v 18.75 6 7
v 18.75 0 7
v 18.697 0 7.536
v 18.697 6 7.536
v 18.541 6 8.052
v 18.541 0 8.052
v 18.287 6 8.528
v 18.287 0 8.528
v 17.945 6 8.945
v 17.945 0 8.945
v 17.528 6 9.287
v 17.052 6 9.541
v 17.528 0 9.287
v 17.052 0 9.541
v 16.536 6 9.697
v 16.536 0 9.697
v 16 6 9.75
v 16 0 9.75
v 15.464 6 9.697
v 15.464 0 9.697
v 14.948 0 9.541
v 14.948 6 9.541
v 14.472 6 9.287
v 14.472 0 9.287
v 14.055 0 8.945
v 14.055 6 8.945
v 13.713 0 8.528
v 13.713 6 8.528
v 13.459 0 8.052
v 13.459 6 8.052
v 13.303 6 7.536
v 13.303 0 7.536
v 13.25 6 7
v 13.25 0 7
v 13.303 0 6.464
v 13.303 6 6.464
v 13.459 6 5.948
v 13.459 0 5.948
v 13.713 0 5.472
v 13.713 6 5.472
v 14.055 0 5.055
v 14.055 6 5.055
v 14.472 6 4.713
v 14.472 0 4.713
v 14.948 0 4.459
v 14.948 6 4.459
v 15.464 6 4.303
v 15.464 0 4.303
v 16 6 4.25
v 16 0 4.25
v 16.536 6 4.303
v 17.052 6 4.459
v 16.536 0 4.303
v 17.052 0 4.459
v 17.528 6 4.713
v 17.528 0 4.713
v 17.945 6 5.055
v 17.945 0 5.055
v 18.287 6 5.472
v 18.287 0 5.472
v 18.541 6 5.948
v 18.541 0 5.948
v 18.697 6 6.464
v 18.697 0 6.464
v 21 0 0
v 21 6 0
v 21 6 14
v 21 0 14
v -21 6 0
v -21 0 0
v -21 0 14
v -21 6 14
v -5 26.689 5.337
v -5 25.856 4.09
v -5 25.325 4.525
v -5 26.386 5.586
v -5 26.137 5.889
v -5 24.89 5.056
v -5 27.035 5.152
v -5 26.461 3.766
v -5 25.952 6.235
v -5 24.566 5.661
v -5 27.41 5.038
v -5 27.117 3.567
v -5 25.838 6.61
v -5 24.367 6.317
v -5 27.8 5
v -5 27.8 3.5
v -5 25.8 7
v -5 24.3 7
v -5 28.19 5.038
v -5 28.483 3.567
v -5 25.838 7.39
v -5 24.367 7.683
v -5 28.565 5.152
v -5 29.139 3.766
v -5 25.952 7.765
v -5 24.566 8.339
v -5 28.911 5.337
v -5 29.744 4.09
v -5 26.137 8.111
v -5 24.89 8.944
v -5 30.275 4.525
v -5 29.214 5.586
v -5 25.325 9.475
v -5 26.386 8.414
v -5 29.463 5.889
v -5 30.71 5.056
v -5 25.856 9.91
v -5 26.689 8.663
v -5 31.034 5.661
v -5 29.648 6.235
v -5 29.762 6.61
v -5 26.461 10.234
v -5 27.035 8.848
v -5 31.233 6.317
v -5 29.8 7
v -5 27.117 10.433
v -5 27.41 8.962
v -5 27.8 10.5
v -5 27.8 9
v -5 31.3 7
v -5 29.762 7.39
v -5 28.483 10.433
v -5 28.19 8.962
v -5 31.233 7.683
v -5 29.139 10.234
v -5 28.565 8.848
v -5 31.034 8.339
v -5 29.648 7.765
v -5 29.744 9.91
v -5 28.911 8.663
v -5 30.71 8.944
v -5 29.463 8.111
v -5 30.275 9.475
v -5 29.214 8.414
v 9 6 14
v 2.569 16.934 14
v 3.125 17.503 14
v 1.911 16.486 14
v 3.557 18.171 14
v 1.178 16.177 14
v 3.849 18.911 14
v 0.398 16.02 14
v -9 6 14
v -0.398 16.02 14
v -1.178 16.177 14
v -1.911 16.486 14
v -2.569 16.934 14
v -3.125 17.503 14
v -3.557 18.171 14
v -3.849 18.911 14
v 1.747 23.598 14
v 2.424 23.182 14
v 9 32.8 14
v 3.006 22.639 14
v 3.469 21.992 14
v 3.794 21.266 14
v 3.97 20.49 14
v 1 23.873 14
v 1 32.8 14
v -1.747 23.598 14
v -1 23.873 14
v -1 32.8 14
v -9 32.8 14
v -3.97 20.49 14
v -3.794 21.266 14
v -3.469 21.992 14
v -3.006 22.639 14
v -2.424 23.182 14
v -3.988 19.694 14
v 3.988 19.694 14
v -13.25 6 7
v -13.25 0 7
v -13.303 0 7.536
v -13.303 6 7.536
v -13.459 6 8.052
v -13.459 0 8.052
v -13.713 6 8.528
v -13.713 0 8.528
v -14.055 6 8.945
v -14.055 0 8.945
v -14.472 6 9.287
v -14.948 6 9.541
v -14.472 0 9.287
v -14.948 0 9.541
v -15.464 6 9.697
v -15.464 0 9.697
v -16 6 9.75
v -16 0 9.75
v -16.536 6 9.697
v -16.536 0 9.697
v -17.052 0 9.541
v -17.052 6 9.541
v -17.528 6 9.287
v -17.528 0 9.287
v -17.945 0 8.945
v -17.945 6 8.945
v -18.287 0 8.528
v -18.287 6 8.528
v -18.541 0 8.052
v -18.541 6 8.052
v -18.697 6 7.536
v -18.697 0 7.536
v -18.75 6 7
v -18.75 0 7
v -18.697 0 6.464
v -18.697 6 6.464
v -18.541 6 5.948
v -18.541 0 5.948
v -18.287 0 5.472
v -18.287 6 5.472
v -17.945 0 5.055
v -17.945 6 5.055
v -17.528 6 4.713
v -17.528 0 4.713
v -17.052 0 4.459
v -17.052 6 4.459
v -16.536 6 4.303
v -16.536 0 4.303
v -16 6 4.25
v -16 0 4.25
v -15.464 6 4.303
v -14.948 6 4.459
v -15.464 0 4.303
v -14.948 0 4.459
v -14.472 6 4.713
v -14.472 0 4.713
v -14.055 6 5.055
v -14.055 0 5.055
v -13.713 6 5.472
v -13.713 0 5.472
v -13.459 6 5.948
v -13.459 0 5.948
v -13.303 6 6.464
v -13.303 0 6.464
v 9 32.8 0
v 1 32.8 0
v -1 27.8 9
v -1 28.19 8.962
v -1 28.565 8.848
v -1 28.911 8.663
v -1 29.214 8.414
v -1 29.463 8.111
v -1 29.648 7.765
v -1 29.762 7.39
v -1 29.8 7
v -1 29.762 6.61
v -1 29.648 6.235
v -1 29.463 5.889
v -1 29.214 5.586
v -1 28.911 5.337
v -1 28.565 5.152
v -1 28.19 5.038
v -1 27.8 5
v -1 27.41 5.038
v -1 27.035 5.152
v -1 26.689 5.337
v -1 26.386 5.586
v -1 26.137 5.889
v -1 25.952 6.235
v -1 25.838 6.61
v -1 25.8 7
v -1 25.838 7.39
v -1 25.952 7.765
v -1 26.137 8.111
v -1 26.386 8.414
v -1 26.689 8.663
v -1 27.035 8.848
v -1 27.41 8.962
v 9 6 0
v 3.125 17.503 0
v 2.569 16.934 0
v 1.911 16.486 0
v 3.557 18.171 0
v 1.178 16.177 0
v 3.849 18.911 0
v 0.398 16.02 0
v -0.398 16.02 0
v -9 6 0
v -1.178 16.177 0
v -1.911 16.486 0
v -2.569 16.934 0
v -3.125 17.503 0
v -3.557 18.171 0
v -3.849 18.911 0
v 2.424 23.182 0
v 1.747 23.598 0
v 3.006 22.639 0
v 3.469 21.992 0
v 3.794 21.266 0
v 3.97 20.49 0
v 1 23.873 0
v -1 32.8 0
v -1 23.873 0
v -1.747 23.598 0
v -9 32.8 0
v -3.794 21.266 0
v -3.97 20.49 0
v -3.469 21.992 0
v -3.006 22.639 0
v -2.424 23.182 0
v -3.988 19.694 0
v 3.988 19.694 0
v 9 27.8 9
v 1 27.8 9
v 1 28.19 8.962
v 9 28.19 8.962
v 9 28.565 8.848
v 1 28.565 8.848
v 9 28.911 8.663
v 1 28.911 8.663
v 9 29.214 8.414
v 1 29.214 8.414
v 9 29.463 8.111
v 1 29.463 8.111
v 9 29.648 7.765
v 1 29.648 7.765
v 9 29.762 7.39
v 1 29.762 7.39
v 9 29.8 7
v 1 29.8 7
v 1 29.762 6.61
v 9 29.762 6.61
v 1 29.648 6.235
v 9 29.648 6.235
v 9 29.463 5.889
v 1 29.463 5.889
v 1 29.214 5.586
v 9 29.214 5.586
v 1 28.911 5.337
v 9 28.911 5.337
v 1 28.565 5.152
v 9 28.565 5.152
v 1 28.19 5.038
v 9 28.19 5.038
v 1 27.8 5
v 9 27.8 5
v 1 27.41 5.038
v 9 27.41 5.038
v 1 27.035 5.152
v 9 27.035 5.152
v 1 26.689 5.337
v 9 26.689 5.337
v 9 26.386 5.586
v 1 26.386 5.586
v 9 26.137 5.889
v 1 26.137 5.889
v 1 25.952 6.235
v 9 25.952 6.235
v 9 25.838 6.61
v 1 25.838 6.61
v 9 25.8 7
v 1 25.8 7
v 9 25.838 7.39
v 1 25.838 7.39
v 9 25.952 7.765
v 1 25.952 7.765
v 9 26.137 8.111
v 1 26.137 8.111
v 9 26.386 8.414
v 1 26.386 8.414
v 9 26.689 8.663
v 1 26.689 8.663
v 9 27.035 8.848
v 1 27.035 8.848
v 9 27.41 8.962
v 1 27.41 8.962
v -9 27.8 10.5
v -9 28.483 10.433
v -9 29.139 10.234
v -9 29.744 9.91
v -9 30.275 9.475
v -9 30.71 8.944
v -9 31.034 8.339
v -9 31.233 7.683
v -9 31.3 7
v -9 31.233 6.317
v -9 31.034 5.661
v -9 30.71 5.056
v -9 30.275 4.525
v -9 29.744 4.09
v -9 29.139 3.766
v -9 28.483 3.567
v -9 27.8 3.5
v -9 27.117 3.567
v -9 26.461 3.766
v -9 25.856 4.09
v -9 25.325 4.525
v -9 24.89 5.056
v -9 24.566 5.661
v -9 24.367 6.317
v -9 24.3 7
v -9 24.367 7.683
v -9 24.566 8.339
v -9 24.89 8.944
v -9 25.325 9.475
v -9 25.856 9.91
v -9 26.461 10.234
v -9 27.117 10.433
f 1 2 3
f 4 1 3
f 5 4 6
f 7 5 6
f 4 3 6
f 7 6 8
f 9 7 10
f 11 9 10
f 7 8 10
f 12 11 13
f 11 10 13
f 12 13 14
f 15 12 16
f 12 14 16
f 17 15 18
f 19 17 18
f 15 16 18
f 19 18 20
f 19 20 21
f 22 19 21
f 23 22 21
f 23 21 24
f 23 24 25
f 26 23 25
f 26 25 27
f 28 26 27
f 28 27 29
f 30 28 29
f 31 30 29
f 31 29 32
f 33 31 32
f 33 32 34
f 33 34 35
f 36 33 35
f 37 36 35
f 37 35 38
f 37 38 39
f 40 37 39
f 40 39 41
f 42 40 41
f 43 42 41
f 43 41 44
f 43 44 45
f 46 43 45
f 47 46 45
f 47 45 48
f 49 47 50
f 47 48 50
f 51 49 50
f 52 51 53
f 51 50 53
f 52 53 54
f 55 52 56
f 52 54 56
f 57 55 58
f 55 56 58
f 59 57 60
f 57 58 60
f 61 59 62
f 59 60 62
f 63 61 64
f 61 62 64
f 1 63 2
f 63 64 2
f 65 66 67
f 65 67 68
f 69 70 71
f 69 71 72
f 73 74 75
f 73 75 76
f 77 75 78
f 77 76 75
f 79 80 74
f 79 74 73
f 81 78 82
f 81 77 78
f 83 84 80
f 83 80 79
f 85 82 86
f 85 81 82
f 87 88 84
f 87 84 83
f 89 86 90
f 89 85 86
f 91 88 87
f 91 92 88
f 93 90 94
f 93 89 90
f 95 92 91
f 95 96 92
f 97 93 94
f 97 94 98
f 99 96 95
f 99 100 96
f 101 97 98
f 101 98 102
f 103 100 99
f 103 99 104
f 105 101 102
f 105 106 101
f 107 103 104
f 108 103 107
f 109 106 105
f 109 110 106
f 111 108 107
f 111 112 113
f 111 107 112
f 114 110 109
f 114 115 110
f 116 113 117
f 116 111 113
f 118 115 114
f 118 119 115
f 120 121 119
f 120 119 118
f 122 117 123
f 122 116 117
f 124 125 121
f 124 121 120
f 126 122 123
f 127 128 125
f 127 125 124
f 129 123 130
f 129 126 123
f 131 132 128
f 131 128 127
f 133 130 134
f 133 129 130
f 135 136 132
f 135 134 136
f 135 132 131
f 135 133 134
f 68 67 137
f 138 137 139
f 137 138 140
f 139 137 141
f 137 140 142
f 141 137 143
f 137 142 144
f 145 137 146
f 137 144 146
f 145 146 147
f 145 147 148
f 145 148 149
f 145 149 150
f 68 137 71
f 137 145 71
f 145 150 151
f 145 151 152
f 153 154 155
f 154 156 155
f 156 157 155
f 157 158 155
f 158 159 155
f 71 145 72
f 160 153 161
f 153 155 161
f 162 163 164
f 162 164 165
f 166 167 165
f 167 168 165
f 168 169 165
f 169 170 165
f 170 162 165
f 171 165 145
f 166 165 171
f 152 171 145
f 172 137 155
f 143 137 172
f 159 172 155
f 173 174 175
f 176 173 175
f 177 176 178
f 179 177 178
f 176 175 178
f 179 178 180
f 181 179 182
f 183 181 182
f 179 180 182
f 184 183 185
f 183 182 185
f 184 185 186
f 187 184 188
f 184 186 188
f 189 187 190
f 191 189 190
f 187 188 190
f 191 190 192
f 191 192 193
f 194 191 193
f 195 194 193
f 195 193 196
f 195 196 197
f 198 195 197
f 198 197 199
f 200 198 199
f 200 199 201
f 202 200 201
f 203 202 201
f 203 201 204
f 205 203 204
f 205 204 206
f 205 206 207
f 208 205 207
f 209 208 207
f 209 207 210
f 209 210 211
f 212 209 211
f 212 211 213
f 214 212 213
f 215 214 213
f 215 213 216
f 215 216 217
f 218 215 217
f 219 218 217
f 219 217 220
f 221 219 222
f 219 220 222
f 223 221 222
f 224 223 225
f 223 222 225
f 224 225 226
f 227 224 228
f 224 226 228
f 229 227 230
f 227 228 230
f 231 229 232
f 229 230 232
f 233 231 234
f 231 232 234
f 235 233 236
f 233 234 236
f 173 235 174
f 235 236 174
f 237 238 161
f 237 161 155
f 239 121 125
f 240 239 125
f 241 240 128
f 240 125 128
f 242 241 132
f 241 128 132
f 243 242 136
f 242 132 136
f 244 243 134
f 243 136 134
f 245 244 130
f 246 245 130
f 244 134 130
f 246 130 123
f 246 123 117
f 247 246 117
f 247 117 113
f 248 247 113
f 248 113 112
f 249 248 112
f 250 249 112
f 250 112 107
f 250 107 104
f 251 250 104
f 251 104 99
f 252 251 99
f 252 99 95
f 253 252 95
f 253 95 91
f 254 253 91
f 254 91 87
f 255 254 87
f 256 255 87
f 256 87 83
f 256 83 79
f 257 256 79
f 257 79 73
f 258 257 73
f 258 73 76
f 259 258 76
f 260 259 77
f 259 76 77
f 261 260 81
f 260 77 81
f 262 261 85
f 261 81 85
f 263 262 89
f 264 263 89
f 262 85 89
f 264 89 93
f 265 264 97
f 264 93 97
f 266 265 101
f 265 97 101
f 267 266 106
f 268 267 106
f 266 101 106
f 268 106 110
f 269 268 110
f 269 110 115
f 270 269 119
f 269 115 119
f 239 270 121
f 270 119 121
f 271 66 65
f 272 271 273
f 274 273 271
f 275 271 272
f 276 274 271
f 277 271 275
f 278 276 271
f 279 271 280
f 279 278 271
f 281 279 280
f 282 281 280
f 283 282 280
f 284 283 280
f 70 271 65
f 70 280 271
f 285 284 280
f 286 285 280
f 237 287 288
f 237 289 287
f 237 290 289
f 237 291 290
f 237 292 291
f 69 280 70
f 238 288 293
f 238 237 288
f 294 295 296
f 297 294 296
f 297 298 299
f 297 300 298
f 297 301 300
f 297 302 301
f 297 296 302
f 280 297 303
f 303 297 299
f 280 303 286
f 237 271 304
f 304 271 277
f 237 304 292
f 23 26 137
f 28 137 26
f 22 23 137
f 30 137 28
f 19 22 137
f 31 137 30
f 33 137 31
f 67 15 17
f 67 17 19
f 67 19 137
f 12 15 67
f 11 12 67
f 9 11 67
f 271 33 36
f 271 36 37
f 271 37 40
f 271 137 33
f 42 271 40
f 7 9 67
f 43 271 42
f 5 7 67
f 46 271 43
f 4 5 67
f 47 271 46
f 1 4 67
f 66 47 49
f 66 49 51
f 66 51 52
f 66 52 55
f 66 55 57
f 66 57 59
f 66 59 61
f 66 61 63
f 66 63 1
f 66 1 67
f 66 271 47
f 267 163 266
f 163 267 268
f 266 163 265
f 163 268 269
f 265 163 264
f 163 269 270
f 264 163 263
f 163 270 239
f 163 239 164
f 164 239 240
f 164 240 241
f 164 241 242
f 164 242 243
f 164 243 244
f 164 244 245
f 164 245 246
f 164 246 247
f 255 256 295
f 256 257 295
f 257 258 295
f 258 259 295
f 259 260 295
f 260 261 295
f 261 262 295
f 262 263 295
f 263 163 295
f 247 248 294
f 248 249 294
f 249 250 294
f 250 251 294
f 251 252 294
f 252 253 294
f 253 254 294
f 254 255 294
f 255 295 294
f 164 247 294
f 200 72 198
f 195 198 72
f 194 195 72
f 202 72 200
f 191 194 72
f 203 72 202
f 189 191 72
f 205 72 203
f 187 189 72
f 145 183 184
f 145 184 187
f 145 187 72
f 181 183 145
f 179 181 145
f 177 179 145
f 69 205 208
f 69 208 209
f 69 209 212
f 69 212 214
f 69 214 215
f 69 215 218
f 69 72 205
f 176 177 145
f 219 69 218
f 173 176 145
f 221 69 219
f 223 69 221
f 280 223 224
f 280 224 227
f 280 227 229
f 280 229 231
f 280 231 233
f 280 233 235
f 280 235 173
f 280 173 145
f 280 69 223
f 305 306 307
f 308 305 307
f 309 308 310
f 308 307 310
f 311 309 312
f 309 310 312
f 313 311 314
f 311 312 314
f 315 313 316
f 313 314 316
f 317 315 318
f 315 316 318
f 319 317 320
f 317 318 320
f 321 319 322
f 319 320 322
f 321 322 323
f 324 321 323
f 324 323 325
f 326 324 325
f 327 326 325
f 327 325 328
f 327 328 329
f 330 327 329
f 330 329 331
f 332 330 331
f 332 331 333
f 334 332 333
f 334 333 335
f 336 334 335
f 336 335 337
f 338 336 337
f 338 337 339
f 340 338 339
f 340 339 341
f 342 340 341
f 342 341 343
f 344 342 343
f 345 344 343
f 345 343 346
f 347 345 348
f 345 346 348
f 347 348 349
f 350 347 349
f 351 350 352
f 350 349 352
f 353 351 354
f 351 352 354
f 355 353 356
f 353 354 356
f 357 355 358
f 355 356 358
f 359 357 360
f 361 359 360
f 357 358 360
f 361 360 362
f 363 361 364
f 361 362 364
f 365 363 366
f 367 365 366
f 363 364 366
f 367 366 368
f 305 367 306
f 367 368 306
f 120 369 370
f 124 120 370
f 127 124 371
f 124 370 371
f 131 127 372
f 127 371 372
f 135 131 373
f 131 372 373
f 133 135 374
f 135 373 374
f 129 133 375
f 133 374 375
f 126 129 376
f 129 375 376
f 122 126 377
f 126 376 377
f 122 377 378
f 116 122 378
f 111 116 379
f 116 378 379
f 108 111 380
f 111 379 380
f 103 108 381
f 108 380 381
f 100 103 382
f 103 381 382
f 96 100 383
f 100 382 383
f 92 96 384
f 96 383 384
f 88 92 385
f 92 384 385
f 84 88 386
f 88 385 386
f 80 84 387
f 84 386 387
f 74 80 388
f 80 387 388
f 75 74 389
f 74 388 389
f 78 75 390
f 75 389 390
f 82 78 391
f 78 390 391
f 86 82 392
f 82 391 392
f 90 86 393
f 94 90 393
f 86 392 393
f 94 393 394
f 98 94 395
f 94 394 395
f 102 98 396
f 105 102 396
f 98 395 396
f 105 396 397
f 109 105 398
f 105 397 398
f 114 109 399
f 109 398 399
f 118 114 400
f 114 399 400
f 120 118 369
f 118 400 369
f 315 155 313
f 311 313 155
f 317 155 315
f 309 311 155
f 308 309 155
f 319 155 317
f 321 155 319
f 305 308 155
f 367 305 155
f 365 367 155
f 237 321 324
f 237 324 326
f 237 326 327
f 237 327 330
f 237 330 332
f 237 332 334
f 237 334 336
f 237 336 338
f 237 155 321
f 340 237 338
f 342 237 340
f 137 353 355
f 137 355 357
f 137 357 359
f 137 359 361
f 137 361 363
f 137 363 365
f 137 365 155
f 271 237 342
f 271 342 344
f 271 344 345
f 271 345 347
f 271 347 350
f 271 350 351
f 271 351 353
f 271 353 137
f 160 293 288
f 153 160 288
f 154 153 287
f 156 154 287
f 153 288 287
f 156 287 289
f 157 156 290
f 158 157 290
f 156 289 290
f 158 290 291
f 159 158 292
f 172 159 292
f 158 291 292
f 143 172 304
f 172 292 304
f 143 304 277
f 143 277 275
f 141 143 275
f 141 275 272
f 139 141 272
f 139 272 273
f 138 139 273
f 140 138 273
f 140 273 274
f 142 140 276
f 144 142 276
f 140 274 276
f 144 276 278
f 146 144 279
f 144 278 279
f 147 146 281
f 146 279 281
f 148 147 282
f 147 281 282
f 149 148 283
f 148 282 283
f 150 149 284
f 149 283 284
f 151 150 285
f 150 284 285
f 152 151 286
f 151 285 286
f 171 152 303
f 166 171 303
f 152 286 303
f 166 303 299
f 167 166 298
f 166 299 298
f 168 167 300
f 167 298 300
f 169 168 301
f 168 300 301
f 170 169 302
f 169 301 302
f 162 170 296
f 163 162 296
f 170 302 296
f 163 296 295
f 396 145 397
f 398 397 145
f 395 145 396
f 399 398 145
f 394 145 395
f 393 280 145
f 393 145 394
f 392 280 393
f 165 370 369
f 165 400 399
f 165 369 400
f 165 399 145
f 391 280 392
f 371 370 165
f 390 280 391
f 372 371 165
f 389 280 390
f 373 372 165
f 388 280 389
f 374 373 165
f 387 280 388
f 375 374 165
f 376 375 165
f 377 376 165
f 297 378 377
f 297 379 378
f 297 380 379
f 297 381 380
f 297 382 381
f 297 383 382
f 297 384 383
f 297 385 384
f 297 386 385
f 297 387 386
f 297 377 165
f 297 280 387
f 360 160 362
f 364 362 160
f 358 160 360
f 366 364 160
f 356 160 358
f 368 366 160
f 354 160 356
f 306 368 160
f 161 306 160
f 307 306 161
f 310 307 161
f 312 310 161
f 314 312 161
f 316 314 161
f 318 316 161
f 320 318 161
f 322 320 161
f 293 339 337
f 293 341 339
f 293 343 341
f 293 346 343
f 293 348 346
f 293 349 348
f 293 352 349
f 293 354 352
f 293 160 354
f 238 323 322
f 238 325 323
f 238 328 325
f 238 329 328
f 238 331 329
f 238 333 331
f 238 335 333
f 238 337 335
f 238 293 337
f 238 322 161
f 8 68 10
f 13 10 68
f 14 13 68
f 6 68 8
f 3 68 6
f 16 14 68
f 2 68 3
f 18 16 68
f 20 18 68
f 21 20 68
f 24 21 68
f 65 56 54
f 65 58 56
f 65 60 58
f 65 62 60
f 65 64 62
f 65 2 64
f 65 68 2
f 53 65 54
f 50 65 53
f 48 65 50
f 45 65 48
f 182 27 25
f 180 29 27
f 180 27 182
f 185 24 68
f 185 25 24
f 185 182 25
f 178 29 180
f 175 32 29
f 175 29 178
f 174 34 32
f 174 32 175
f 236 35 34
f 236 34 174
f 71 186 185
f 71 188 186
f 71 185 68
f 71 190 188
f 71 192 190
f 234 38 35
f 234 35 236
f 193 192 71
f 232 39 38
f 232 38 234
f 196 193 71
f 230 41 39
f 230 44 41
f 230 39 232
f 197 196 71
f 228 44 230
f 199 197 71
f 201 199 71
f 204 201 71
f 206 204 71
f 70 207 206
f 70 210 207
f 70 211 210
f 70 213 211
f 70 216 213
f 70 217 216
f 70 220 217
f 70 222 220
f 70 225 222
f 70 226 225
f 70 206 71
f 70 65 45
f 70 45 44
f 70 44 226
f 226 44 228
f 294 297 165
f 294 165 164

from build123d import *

# Parameters (mm, degrees)
EXTRUDE_1_DEPTH     = 14
SKETCH_2_R          = 4
SKETCH_2_W          = 2
SKETCH_2_H          = 8.927016654
CUT_EXTRUDE_2_DEPTH = 14
CUT_EXTRUDE_3_REACH = 34.8
SKETCH_4_R          = 2.75
SKETCH_5_R          = 2
CUT_EXTRUDE_4_DEPTH = 18
SKETCH_6_R          = 3.5
CUT_EXTRUDE_5_DEPTH = 4


with BuildPart() as part:
    # 草图1 → 凸台-拉伸1 (new body)
    with BuildSketch(Plane.XY):
        Polygon((21, 0), (-21, 0), (-21, 6), (-9, 6), (-9, 32.8), (9, 32.8), (9, 6), (21, 6), align=None)
    extrude(amount=EXTRUDE_1_DEPTH)

    # 草图2 → 切除-拉伸2 (cut)
    with BuildSketch(Plane(origin=(0, 0, 0), x_dir=(-1, 0, 0), z_dir=(0, 0, -1))):
        with Locations((0, 20)):
            Circle(SKETCH_2_R)
        with Locations((0, 28.336491673)):
            Rectangle(SKETCH_2_W, SKETCH_2_H)
    extrude(amount=-CUT_EXTRUDE_2_DEPTH, mode=Mode.SUBTRACT)

    # 草图4 → 切除-拉伸3 (cut, up to next)
    with BuildSketch(Plane.XZ, mode=Mode.PRIVATE) as cut_extrude_3_sk1:
        with Locations((16, 7)):
            Circle(SKETCH_4_R)
    cut_extrude_3_tool1 = extrude(cut_extrude_3_sk1.sketch, amount=-CUT_EXTRUDE_3_REACH, mode=Mode.PRIVATE) & part.part
    add(cut_extrude_3_tool1.solids().sort_by_distance((16, 0, 7))[0], mode=Mode.SUBTRACT)
    # 草图4 → 切除-拉伸3 (cut, up to next)
    with BuildSketch(Plane.XZ, mode=Mode.PRIVATE) as cut_extrude_3_sk2:
        with Locations((-16, 7)):
            Circle(SKETCH_4_R)
    cut_extrude_3_tool2 = extrude(cut_extrude_3_sk2.sketch, amount=-CUT_EXTRUDE_3_REACH, mode=Mode.PRIVATE) & part.part
    add(cut_extrude_3_tool2.solids().sort_by_distance((-16, 0, 7))[0], mode=Mode.SUBTRACT)

    # 草图5 → 切除-拉伸4 (cut)
    with BuildSketch(Plane.ZY.offset(9)):
        with Locations((7, 27.8)):
            Circle(SKETCH_5_R)
    extrude(amount=-CUT_EXTRUDE_4_DEPTH, mode=Mode.SUBTRACT)

    # 草图6 → 切除-拉伸5 (cut)
    with BuildSketch(Plane.ZY.offset(9)):
        with Locations((7, 27.8)):
            Circle(SKETCH_6_R)
    extrude(amount=-CUT_EXTRUDE_5_DEPTH, mode=Mode.SUBTRACT)


solid = part.part
